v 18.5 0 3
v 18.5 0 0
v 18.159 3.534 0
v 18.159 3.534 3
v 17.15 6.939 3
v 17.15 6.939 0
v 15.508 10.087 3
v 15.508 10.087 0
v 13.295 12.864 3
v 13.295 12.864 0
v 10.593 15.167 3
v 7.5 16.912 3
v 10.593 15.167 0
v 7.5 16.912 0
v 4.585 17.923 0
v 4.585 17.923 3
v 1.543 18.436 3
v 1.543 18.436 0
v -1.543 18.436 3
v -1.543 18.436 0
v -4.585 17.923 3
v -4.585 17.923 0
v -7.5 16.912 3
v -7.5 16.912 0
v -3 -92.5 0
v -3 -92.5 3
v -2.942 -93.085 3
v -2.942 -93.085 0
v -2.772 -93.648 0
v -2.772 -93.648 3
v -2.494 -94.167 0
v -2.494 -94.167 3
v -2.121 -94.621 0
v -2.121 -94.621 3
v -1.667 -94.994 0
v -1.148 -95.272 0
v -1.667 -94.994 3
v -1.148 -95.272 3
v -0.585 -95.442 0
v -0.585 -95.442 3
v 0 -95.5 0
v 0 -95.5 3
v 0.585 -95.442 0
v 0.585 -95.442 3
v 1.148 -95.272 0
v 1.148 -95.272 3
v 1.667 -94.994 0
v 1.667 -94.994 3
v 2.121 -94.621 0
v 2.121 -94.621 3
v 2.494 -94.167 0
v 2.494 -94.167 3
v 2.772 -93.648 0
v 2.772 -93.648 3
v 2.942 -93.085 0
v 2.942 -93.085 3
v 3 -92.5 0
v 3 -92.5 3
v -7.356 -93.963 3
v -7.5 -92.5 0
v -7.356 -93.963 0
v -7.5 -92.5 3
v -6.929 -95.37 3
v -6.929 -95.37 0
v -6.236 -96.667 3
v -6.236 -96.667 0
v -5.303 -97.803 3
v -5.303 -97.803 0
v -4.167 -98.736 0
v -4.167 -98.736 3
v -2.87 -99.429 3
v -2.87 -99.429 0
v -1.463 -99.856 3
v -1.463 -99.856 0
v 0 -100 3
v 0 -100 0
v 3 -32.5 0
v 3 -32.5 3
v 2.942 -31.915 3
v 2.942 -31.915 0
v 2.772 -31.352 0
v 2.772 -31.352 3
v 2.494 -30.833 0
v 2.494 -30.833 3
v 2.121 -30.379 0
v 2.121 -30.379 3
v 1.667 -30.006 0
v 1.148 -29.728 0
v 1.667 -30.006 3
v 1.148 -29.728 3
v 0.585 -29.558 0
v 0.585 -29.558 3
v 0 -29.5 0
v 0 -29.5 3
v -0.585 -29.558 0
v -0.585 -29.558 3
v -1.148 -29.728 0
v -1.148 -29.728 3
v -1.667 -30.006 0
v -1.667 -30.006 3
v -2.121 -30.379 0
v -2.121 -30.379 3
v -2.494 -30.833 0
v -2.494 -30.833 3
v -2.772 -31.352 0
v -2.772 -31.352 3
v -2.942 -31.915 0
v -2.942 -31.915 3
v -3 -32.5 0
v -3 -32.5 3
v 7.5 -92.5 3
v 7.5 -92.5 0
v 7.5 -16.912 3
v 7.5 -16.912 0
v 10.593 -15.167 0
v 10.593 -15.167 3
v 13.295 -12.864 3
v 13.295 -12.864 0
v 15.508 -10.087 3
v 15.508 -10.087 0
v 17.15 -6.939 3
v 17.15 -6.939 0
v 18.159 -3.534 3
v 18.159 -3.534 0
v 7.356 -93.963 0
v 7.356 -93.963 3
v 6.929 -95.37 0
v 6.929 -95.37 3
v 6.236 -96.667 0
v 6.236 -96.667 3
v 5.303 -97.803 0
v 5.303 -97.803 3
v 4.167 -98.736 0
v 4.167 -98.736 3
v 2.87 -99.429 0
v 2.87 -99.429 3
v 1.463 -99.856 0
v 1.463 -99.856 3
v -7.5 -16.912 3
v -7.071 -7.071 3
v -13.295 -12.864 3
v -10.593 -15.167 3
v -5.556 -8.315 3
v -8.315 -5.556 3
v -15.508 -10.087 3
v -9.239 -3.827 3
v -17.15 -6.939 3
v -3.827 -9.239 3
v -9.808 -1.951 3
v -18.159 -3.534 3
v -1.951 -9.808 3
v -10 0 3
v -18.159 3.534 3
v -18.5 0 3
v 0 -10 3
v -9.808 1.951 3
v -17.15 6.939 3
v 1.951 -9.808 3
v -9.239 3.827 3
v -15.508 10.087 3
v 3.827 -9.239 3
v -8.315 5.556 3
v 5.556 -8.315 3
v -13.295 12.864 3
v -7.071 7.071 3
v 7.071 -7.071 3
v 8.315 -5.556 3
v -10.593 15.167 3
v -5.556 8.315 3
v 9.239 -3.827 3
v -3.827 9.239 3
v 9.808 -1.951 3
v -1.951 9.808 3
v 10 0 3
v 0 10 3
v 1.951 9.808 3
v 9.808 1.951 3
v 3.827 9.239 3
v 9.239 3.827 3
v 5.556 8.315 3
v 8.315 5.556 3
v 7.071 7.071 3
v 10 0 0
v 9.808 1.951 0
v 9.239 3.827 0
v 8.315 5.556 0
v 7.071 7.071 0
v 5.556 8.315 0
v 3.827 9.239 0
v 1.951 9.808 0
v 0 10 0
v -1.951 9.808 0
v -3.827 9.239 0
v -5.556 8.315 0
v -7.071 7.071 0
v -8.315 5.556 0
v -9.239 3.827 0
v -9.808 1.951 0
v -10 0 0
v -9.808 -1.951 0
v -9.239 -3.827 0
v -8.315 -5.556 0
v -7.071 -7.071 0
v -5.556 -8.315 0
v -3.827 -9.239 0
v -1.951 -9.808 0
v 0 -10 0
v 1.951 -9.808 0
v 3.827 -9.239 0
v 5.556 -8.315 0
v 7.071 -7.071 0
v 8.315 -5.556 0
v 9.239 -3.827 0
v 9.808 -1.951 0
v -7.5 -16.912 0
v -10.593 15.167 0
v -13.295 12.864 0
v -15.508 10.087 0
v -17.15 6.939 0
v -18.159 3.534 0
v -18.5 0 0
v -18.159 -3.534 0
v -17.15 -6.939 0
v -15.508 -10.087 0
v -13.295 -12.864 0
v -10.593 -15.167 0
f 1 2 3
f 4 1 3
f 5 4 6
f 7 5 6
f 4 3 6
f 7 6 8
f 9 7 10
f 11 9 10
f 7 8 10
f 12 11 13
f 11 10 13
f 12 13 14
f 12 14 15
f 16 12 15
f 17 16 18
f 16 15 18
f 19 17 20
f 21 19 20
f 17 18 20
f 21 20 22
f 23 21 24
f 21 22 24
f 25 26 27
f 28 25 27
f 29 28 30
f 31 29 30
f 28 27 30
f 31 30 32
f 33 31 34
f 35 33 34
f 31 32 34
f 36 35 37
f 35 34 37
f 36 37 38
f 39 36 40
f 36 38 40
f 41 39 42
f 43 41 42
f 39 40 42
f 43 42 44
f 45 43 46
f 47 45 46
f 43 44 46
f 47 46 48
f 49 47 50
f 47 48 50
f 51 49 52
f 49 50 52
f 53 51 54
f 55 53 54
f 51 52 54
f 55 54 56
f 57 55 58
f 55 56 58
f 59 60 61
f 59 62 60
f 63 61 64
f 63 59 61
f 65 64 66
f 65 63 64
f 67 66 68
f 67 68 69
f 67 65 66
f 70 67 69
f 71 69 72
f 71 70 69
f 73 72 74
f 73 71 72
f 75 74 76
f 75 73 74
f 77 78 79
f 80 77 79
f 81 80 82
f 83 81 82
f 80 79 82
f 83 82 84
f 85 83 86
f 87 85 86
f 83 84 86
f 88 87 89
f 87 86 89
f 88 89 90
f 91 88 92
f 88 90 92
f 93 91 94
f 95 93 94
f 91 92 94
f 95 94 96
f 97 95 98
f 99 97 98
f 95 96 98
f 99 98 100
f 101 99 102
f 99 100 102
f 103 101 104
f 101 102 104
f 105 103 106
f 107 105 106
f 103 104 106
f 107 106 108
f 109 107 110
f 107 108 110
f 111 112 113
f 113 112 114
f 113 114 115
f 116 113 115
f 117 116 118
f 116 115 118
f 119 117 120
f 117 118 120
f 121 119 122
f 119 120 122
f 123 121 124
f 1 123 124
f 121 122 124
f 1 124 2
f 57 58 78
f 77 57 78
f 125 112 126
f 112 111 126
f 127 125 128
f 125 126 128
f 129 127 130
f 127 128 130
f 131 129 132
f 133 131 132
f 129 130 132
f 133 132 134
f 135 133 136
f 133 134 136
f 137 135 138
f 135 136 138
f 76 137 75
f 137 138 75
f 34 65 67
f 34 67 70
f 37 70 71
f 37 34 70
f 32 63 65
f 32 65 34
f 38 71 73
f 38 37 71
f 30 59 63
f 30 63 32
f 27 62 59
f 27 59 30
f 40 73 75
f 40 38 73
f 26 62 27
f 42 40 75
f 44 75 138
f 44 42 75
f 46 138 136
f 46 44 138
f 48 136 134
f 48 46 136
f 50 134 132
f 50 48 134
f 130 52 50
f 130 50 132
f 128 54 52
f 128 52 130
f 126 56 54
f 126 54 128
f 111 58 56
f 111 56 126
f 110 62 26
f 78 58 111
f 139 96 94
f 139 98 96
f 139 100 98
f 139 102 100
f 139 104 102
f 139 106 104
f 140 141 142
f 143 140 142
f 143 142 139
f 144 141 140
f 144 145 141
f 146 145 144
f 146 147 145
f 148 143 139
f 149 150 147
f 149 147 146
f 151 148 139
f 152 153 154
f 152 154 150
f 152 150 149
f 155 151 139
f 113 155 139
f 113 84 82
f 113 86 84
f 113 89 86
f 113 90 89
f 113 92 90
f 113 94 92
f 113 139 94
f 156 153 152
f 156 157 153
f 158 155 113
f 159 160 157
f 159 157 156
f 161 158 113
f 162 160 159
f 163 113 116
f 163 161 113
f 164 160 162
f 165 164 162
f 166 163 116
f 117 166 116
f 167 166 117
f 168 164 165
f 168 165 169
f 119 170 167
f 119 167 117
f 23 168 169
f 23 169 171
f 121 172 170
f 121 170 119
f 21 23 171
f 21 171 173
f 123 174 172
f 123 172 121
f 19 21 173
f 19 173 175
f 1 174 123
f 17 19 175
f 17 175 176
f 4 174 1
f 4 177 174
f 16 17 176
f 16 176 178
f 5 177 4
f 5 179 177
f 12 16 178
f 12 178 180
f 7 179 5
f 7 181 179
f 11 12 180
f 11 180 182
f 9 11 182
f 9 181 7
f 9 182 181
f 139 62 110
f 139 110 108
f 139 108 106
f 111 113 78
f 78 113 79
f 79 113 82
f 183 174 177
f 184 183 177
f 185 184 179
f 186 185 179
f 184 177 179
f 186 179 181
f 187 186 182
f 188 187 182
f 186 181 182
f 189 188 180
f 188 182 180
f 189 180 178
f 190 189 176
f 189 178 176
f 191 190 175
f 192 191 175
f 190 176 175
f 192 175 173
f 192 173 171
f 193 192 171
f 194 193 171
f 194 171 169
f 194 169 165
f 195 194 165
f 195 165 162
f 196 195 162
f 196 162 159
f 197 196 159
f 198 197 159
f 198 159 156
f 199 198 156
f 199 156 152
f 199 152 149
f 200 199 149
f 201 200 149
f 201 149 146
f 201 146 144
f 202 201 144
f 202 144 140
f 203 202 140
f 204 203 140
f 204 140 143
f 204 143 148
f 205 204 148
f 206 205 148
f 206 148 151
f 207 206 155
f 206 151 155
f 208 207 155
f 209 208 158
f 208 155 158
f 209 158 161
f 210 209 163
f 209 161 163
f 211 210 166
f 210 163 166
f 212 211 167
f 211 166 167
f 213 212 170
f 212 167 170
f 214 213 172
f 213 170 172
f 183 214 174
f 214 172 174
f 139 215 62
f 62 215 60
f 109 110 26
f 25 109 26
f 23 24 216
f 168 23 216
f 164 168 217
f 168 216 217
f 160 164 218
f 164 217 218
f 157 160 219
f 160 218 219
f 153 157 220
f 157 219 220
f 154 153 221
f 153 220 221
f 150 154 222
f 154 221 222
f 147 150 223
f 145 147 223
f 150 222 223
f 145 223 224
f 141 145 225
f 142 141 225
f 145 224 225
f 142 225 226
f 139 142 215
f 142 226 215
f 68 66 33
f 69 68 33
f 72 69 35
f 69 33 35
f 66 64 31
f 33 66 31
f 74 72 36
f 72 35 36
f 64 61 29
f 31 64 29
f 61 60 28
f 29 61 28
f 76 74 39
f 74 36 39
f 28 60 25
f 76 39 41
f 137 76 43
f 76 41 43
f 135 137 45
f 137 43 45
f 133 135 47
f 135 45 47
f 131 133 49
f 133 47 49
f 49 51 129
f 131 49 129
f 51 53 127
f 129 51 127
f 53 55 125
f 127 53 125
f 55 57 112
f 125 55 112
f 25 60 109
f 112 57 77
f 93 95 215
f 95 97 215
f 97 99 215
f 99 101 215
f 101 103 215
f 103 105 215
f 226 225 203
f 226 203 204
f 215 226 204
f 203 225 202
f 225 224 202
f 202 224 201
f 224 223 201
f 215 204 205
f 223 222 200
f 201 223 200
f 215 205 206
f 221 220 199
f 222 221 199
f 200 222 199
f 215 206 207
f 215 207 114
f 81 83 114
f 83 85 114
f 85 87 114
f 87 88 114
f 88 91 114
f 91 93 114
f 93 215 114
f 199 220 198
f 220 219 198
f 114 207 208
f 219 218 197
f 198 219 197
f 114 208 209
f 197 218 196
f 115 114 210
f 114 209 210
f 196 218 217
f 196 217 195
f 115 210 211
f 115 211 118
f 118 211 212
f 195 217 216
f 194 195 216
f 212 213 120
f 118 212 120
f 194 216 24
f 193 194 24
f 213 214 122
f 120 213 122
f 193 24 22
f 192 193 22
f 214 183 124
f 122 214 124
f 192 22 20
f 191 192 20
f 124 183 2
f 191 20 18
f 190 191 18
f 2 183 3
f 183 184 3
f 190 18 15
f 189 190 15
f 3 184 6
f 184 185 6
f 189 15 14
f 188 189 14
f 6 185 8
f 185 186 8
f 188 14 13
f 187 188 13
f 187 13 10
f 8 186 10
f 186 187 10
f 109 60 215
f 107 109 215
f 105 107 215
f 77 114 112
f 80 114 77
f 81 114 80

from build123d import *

# Parameters (mm, degrees)
F1_DEPTH = 3
F2_R     = 10
F3_DEPTH = 25
F4_R     = 7.49999
F6_DEPTH = 25


# Not quite as in the source:
# - a fillet or chamfer is up to 0.001 mm smaller than in the source, because OpenCascade refuses the exact size


with BuildPart() as f1:
    # F0 (on Top) → F1 (new body)
    with BuildSketch(Plane.XY):
        with BuildLine():
            Line((7.5, -16.9115345253), (7.5, 16.9115345253))
            ThreePointArc((7.5, 16.9115345253), (0, 18.5), (-7.5, 16.9115345253))
            Line((-7.5, 16.9115345253), (-7.5, -16.9115345253))
            ThreePointArc((-7.5, -16.9115345253), (0, -18.5), (7.5, -16.9115345253))
        make_face()
        with BuildLine():
            Line((-7.5, -16.9115345253), (-7.5, 16.9115345253))
            ThreePointArc((-7.5, 16.9115345253), (-18.5, 0), (-7.5, -16.9115345253))
        make_face()
        with BuildLine():
            ThreePointArc((7.5, -16.9115345253), (15.5080624193, -10.0871205009), (18.5, 0))
            ThreePointArc((18.5, 0), (15.5080624193, 10.0871205009), (7.5, 16.9115345253))
            Line((7.5, 16.9115345253), (7.5, -16.9115345253))
        make_face()
        with BuildLine():
            Line((7.5, -100), (7.5, -16.9115345253))
            ThreePointArc((7.5, -16.9115345253), (0, -18.5), (-7.5, -16.9115345253))
            Line((-7.5, -16.9115345253), (-7.5, -100))
            Line((-7.5, -100), (7.5, -100))
        make_face()
    extrude(amount=F1_DEPTH)

    # F2 (on face) → F3 (cut)
    with BuildSketch(Plane.XY.offset(3)):
        Circle(F2_R)
    extrude(amount=-F3_DEPTH, mode=Mode.SUBTRACT)

    # F4 (radius 7.5 in the source; OpenCascade refuses exactly that, so slightly less here)
    f4_edges = [f1.edges().sort_by_distance(p)[0] for p in [
        (7.5, -100, 1.5),
        (-7.5, -100, 1.5),
    ]]
    fillet(f4_edges, radius=F4_R)

    # F5 (on face) → F6 (cut)
    with BuildSketch(Plane.XY.offset(3)):
        with BuildLine():
            ThreePointArc((-3, -92.5), (0, -95.5), (3, -92.5))
            Line((3, -92.5), (3, -32.5))
            ThreePointArc((3, -32.5), (0, -29.5), (-3, -32.5))
            Line((-3, -32.5), (-3, -92.5))
        make_face()
    extrude(amount=-F6_DEPTH, mode=Mode.SUBTRACT)


solid = f1.part
